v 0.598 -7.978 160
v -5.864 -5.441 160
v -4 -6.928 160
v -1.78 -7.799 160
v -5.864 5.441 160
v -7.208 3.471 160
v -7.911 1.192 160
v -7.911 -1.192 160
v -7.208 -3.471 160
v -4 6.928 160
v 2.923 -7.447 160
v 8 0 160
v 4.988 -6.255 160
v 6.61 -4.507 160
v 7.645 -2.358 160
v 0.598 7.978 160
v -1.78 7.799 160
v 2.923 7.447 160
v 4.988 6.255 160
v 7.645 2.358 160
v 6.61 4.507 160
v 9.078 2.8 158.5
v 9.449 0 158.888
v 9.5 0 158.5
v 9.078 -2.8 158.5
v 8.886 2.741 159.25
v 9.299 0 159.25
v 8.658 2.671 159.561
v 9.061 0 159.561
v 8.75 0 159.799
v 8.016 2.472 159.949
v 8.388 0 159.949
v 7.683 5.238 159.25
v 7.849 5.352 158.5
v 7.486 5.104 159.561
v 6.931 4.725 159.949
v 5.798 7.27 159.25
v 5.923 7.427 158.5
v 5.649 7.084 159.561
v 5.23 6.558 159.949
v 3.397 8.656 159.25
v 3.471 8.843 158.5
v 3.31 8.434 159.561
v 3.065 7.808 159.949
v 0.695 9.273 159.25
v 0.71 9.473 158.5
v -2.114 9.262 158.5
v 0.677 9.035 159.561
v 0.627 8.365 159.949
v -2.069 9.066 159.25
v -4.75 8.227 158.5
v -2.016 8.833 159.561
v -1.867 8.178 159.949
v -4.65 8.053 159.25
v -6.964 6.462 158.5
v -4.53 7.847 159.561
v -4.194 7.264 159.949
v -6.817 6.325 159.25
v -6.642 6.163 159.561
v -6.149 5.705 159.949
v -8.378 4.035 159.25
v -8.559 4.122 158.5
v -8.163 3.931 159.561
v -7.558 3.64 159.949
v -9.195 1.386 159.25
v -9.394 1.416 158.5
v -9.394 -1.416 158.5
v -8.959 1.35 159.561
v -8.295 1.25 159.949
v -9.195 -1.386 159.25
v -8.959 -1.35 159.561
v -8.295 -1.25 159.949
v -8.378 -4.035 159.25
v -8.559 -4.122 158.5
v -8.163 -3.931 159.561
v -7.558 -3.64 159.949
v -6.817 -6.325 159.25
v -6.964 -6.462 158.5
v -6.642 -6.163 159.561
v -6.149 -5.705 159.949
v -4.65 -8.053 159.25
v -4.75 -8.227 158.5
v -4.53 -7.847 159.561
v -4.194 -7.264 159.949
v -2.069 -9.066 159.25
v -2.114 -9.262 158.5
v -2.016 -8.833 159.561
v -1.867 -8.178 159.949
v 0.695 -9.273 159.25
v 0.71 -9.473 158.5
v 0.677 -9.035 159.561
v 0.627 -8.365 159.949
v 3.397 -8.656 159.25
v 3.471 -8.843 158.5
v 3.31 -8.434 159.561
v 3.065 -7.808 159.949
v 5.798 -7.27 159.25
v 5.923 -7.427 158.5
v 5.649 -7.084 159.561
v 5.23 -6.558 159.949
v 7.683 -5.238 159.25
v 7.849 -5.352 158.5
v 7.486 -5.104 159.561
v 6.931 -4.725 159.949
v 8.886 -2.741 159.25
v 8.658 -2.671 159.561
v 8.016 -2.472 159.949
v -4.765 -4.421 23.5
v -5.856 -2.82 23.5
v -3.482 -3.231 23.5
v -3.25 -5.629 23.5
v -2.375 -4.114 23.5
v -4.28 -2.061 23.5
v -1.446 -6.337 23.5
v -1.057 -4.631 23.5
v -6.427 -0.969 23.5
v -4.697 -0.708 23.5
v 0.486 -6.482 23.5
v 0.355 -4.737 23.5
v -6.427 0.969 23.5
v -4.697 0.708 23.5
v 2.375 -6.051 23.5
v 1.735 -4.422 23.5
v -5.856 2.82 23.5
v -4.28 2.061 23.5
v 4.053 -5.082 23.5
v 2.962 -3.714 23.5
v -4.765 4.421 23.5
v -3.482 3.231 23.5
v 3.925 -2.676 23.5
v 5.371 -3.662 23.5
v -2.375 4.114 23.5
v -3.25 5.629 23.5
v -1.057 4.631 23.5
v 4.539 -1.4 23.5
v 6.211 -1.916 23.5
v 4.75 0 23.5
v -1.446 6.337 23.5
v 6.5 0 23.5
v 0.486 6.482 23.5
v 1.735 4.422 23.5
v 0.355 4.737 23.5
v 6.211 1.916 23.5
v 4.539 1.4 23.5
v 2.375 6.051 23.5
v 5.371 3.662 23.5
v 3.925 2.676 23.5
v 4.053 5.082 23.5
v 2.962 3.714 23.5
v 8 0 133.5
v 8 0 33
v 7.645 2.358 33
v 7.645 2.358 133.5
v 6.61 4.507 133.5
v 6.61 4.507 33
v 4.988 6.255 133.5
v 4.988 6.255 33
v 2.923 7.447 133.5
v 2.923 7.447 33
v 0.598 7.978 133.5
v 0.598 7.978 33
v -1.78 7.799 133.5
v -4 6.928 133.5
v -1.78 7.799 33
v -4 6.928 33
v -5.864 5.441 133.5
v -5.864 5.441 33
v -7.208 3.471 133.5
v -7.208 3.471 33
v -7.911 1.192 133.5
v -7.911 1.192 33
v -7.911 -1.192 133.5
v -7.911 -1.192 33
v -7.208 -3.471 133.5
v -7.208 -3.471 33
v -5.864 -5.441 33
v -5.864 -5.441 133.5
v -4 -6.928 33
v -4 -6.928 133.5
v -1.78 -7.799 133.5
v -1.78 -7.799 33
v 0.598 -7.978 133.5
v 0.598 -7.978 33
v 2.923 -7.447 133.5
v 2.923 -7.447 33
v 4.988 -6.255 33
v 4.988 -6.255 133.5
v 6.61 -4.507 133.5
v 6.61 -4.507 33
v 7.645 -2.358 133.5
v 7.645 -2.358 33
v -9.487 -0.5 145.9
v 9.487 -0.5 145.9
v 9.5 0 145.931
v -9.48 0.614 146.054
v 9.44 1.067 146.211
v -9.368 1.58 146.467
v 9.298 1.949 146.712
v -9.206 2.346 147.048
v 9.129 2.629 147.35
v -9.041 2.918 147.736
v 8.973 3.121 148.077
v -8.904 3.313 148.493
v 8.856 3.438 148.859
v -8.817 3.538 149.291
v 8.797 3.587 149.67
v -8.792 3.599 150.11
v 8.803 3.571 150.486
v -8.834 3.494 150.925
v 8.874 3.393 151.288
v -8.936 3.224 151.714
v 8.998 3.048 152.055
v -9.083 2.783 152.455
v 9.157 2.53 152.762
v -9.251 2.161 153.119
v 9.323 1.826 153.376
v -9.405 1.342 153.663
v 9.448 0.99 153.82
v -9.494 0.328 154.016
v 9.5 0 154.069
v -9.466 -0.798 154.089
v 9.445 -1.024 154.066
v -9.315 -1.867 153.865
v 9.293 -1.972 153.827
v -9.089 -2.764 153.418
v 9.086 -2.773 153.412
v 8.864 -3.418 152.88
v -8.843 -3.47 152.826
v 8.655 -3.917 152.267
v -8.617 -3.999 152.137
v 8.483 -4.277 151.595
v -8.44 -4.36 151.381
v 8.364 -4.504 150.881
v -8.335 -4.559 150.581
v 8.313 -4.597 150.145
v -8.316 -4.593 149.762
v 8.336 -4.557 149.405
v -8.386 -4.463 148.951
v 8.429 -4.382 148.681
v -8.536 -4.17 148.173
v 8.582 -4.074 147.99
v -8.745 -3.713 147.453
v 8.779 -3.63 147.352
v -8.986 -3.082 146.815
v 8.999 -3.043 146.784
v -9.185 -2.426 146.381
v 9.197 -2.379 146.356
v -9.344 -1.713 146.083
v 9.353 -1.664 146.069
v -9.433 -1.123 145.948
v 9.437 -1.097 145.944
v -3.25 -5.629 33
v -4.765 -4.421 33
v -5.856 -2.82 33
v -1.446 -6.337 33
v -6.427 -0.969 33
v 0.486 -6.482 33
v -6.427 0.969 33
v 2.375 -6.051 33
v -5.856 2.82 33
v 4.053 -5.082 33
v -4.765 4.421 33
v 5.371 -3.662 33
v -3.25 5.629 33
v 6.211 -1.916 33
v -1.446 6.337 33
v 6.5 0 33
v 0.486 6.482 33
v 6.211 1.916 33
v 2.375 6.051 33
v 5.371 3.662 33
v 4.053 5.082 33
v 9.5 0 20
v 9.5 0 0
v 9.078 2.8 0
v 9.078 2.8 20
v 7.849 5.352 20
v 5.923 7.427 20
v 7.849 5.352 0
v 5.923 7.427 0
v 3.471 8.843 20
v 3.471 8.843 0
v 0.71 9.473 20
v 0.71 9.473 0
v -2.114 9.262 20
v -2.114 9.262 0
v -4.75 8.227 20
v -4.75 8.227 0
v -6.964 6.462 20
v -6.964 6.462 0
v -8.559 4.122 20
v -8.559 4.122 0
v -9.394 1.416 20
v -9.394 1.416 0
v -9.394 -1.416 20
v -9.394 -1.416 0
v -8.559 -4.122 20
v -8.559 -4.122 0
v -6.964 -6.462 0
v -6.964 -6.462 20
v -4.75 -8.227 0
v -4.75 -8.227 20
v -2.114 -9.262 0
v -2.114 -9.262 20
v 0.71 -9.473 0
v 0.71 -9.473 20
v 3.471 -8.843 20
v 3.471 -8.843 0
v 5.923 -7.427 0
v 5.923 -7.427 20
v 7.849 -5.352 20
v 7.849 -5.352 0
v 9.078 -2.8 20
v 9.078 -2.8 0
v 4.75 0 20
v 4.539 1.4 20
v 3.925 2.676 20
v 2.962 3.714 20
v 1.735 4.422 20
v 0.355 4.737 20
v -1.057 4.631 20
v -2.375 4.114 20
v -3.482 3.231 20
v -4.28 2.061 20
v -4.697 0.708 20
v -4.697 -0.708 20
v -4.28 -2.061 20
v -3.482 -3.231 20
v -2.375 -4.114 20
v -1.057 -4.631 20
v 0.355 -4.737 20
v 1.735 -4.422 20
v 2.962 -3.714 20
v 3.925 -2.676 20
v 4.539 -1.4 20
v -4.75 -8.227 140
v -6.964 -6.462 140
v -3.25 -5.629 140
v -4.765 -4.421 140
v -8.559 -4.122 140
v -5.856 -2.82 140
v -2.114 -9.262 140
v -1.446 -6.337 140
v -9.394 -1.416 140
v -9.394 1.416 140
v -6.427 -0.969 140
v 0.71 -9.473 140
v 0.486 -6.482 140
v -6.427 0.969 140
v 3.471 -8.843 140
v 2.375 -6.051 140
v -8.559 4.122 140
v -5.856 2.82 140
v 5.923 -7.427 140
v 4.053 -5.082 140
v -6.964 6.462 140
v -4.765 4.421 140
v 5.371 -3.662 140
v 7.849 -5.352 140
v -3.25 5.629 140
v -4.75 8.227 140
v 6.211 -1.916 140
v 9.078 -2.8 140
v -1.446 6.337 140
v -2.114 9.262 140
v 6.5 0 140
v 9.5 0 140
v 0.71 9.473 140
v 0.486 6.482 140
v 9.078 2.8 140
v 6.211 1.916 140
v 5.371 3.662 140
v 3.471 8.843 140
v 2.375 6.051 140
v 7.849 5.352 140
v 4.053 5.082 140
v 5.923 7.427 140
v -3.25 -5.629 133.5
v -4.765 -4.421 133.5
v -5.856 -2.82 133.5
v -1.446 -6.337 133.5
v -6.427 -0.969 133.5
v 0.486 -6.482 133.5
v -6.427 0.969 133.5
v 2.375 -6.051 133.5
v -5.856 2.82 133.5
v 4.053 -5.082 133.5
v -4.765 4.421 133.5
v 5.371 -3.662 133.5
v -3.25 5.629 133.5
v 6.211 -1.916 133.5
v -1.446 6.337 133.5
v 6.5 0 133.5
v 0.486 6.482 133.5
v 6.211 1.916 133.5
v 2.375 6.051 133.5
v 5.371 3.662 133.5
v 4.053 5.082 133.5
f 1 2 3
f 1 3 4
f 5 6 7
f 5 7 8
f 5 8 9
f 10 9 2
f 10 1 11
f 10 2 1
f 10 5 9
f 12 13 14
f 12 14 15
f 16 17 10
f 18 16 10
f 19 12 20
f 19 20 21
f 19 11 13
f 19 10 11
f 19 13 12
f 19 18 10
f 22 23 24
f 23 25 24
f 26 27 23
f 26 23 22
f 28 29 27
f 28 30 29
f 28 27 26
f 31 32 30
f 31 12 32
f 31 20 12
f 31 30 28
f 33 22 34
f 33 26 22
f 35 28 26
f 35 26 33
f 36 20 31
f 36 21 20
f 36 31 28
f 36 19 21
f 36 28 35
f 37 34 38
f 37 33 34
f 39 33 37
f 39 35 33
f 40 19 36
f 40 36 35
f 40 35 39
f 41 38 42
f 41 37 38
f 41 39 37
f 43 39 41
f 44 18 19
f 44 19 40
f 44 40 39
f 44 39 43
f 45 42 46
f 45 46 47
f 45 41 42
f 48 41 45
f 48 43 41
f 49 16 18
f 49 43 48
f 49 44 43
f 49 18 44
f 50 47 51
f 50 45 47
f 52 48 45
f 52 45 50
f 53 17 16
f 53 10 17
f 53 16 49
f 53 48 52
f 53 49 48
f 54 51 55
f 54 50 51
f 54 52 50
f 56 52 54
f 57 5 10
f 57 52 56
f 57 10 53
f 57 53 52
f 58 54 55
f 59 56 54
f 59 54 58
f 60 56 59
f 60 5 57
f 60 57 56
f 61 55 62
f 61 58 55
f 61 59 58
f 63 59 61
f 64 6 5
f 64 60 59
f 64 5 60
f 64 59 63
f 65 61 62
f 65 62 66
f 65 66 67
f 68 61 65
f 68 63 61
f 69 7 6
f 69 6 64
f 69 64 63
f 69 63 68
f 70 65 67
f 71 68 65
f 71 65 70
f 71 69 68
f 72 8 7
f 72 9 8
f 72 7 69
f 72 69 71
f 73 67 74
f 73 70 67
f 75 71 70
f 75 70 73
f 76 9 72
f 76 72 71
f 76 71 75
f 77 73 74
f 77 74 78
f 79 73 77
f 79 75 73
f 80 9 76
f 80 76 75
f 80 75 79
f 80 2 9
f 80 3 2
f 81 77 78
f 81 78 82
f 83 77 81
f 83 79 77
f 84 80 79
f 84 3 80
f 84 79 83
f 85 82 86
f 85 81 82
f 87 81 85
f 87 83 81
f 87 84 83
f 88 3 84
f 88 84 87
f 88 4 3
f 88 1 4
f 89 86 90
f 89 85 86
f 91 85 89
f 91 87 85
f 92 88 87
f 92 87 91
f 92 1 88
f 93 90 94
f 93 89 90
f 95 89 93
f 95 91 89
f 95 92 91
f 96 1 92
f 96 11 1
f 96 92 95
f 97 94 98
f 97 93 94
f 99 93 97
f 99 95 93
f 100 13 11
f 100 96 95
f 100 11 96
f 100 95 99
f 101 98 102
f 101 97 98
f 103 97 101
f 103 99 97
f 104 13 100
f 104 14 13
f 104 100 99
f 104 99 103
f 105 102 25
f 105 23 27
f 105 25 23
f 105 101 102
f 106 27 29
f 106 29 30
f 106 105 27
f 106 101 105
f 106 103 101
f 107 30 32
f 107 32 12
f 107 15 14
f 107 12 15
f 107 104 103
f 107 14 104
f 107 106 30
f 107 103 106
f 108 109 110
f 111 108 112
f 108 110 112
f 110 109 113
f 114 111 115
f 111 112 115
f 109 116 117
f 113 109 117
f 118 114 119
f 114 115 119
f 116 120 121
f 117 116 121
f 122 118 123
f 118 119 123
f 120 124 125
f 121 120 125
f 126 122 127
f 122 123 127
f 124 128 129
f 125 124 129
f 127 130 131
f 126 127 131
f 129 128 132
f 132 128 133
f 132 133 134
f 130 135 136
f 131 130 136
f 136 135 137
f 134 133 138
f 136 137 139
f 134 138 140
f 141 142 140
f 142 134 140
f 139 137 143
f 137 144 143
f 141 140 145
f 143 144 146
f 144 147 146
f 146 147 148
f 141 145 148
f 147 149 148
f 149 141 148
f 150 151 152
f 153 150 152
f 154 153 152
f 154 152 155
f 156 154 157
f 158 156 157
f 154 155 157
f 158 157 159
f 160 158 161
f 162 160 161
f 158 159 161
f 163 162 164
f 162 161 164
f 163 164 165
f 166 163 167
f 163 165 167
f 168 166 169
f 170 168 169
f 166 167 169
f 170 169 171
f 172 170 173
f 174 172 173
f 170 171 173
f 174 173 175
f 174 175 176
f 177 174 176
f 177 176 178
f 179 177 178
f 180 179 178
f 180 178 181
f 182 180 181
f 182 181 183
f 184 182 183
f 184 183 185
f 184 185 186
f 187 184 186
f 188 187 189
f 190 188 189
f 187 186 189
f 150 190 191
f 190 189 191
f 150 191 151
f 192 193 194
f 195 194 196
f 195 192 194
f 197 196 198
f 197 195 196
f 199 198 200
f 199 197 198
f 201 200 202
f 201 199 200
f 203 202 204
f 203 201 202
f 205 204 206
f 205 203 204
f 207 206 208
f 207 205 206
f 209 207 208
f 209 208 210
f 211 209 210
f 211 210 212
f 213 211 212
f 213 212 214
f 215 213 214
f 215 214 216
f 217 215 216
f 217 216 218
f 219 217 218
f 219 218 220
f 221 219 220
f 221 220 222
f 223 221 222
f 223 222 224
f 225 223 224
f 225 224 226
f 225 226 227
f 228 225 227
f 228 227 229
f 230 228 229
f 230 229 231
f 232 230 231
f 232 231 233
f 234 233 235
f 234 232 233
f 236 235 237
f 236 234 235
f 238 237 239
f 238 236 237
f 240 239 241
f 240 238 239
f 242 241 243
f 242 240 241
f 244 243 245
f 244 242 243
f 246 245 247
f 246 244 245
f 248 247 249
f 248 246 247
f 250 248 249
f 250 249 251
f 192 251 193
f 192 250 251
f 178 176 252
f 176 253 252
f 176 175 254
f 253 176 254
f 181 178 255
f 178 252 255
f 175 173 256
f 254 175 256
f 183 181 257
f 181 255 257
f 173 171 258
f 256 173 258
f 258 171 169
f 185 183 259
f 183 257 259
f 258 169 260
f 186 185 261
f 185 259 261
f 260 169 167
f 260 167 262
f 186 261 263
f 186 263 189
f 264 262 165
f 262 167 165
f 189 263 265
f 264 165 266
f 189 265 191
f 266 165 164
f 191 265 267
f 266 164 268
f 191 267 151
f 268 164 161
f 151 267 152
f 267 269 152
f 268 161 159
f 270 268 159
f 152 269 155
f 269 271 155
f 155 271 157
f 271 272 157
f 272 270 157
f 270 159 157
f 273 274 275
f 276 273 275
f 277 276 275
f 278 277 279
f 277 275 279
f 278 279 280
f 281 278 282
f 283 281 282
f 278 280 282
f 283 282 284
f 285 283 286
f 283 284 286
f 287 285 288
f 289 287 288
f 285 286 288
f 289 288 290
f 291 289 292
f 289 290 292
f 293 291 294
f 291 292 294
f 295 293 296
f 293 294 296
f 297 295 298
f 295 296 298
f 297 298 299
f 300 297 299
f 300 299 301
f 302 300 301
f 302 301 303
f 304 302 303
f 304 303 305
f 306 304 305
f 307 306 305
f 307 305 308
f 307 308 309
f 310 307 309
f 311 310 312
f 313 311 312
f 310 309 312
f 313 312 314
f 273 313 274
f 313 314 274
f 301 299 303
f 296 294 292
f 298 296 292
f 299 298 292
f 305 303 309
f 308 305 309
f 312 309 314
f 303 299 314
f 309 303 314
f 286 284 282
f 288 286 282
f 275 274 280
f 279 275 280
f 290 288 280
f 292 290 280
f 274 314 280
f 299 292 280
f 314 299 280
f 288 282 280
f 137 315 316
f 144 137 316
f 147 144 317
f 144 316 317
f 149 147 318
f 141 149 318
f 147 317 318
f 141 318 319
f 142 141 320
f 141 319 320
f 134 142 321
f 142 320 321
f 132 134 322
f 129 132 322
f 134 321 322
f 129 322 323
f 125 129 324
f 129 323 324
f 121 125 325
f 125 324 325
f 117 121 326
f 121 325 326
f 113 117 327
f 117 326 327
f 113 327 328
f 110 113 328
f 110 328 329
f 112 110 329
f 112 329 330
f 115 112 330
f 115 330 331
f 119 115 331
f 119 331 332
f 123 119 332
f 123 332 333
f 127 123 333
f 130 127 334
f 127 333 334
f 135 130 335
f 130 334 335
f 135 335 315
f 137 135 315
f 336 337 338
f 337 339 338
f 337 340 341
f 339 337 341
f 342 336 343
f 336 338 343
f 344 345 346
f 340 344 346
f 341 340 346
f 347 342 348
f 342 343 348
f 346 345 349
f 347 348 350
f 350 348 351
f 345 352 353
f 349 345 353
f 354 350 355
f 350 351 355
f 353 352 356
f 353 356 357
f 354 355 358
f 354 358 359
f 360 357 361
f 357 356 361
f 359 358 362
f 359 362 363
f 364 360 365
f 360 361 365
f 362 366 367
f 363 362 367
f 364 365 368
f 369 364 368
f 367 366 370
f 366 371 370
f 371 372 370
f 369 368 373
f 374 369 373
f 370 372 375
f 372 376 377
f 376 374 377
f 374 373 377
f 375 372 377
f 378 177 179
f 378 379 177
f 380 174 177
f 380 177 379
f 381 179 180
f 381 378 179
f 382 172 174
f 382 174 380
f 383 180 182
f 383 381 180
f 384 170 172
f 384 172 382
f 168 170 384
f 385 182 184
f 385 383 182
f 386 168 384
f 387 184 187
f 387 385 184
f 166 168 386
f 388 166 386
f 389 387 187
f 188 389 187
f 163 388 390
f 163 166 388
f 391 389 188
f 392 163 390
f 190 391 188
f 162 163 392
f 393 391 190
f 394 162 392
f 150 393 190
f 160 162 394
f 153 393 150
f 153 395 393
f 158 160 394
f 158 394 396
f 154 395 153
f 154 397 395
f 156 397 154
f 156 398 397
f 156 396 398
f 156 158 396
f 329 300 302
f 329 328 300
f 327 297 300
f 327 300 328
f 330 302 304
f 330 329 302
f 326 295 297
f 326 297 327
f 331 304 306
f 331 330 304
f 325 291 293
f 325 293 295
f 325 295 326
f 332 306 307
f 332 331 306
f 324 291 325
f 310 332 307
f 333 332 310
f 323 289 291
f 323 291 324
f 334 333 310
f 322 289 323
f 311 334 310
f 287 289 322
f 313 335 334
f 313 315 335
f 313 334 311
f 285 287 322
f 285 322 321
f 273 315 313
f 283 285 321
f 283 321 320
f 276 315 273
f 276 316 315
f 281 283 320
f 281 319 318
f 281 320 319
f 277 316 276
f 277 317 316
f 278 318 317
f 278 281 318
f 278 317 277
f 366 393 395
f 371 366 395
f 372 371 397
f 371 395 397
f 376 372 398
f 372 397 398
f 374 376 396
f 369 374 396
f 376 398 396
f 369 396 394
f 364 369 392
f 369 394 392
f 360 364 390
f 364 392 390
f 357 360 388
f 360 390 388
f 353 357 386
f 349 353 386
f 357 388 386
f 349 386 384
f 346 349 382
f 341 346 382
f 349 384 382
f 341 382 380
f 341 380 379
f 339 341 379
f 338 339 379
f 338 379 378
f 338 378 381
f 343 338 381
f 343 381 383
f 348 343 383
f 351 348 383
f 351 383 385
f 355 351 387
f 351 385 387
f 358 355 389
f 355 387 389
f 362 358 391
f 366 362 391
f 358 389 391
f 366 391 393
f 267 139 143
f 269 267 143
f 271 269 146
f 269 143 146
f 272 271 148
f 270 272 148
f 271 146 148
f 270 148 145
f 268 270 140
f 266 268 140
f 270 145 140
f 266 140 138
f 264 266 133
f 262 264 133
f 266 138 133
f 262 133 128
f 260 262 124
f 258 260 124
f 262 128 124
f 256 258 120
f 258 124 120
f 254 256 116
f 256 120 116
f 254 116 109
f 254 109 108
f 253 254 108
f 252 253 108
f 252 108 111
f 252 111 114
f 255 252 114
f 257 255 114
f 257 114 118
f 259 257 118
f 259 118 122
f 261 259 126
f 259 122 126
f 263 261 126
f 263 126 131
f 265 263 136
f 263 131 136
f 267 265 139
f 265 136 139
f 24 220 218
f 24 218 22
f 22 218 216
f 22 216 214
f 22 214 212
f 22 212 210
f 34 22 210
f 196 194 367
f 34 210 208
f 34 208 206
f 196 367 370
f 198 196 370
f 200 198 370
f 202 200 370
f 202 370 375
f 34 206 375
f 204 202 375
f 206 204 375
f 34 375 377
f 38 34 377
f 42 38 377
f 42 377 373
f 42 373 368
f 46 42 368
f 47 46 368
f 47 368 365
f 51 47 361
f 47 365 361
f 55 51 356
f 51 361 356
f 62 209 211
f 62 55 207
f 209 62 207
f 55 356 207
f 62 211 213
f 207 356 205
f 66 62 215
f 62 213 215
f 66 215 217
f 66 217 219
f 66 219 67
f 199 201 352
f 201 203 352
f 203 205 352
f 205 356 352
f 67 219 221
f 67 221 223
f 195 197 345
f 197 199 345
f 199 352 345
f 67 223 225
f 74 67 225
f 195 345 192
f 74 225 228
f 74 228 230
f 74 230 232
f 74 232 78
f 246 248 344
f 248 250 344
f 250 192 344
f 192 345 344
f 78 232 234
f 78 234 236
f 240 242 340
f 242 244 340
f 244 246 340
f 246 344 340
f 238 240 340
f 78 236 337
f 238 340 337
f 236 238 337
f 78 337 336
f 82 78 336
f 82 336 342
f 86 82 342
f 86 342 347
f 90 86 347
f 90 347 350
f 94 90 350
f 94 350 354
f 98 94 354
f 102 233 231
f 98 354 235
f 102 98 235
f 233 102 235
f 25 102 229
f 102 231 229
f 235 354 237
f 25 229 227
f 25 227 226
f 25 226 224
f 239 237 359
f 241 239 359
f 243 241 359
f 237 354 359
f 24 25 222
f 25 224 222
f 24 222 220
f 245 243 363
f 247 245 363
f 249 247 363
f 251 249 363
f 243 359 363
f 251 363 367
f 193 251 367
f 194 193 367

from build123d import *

# Parameters (mm, degrees)
SKETCH1_R               = 9.5
BOSS_EXTRUDE1_DEPTH     = 20
SKETCH2_R               = 4.75
BOSS_EXTRUDE2_DEPTH     = 3.5
SKETCH3_R               = 6.5
BOSS_EXTRUDE3_DEPTH     = 9.5
SKETCH4_R               = 8
BOSS_EXTRUDE4_DEPTH     = 100.5
SKETCH5_R               = 6.5
BOSS_EXTRUDE5_DEPTH     = 6.5
SKETCH6_R               = 9.5
BOSS_EXTRUDE6_DEPTH     = 20
CUT_EXTRUDE1_DEPTH      = 161.563071719
CUT_EXTRUDE1_DEPTH_BACK = 161.563071719
SKETCH7_R               = 4.1
FILLET1_R               = 1.5


with BuildPart() as part:
    # Sketch1 → Boss-Extrude1 (new body)
    with BuildSketch(Plane.XY):
        Circle(SKETCH1_R)
    extrude(amount=BOSS_EXTRUDE1_DEPTH)

    # Sketch2 → Boss-Extrude2 (add)
    with BuildSketch(Plane.XY.offset(20)):
        Circle(SKETCH2_R)
    extrude(amount=BOSS_EXTRUDE2_DEPTH)

    # Sketch3 → Boss-Extrude3 (add)
    with BuildSketch(Plane.XY.offset(23.5)):
        Circle(SKETCH3_R)
    extrude(amount=BOSS_EXTRUDE3_DEPTH)

    # Sketch4 → Boss-Extrude4 (add)
    with BuildSketch(Plane.XY.offset(33)):
        Circle(SKETCH4_R)
    extrude(amount=BOSS_EXTRUDE4_DEPTH)

    # Sketch5 → Boss-Extrude5 (add)
    with BuildSketch(Plane.XY.offset(133.5)):
        Circle(SKETCH5_R)
    extrude(amount=BOSS_EXTRUDE5_DEPTH)

    # Sketch6 → Boss-Extrude6 (add)
    with BuildSketch(Plane.XY.offset(140)):
        Circle(SKETCH6_R)
    extrude(amount=BOSS_EXTRUDE6_DEPTH)

    # Sketch7 → Cut-Extrude1 (cut, two sides: drawn at the far end of the back side and taken through both)
    with BuildSketch(Plane(origin=(0, 0, 0), x_dir=(0, 0, -1), z_dir=(1, 0, 0)).offset(-CUT_EXTRUDE1_DEPTH_BACK)):
        with Locations((-150, -0.5)):
            Circle(SKETCH7_R)
    extrude(amount=CUT_EXTRUDE1_DEPTH + CUT_EXTRUDE1_DEPTH_BACK, mode=Mode.SUBTRACT)

    # Fillet1
    fillet1_edges = [part.edges().sort_by_distance(p)[0] for p in [
        (-9.5, 0, 160),
    ]]
    fillet(fillet1_edges, radius=FILLET1_R)


solid = part.part
